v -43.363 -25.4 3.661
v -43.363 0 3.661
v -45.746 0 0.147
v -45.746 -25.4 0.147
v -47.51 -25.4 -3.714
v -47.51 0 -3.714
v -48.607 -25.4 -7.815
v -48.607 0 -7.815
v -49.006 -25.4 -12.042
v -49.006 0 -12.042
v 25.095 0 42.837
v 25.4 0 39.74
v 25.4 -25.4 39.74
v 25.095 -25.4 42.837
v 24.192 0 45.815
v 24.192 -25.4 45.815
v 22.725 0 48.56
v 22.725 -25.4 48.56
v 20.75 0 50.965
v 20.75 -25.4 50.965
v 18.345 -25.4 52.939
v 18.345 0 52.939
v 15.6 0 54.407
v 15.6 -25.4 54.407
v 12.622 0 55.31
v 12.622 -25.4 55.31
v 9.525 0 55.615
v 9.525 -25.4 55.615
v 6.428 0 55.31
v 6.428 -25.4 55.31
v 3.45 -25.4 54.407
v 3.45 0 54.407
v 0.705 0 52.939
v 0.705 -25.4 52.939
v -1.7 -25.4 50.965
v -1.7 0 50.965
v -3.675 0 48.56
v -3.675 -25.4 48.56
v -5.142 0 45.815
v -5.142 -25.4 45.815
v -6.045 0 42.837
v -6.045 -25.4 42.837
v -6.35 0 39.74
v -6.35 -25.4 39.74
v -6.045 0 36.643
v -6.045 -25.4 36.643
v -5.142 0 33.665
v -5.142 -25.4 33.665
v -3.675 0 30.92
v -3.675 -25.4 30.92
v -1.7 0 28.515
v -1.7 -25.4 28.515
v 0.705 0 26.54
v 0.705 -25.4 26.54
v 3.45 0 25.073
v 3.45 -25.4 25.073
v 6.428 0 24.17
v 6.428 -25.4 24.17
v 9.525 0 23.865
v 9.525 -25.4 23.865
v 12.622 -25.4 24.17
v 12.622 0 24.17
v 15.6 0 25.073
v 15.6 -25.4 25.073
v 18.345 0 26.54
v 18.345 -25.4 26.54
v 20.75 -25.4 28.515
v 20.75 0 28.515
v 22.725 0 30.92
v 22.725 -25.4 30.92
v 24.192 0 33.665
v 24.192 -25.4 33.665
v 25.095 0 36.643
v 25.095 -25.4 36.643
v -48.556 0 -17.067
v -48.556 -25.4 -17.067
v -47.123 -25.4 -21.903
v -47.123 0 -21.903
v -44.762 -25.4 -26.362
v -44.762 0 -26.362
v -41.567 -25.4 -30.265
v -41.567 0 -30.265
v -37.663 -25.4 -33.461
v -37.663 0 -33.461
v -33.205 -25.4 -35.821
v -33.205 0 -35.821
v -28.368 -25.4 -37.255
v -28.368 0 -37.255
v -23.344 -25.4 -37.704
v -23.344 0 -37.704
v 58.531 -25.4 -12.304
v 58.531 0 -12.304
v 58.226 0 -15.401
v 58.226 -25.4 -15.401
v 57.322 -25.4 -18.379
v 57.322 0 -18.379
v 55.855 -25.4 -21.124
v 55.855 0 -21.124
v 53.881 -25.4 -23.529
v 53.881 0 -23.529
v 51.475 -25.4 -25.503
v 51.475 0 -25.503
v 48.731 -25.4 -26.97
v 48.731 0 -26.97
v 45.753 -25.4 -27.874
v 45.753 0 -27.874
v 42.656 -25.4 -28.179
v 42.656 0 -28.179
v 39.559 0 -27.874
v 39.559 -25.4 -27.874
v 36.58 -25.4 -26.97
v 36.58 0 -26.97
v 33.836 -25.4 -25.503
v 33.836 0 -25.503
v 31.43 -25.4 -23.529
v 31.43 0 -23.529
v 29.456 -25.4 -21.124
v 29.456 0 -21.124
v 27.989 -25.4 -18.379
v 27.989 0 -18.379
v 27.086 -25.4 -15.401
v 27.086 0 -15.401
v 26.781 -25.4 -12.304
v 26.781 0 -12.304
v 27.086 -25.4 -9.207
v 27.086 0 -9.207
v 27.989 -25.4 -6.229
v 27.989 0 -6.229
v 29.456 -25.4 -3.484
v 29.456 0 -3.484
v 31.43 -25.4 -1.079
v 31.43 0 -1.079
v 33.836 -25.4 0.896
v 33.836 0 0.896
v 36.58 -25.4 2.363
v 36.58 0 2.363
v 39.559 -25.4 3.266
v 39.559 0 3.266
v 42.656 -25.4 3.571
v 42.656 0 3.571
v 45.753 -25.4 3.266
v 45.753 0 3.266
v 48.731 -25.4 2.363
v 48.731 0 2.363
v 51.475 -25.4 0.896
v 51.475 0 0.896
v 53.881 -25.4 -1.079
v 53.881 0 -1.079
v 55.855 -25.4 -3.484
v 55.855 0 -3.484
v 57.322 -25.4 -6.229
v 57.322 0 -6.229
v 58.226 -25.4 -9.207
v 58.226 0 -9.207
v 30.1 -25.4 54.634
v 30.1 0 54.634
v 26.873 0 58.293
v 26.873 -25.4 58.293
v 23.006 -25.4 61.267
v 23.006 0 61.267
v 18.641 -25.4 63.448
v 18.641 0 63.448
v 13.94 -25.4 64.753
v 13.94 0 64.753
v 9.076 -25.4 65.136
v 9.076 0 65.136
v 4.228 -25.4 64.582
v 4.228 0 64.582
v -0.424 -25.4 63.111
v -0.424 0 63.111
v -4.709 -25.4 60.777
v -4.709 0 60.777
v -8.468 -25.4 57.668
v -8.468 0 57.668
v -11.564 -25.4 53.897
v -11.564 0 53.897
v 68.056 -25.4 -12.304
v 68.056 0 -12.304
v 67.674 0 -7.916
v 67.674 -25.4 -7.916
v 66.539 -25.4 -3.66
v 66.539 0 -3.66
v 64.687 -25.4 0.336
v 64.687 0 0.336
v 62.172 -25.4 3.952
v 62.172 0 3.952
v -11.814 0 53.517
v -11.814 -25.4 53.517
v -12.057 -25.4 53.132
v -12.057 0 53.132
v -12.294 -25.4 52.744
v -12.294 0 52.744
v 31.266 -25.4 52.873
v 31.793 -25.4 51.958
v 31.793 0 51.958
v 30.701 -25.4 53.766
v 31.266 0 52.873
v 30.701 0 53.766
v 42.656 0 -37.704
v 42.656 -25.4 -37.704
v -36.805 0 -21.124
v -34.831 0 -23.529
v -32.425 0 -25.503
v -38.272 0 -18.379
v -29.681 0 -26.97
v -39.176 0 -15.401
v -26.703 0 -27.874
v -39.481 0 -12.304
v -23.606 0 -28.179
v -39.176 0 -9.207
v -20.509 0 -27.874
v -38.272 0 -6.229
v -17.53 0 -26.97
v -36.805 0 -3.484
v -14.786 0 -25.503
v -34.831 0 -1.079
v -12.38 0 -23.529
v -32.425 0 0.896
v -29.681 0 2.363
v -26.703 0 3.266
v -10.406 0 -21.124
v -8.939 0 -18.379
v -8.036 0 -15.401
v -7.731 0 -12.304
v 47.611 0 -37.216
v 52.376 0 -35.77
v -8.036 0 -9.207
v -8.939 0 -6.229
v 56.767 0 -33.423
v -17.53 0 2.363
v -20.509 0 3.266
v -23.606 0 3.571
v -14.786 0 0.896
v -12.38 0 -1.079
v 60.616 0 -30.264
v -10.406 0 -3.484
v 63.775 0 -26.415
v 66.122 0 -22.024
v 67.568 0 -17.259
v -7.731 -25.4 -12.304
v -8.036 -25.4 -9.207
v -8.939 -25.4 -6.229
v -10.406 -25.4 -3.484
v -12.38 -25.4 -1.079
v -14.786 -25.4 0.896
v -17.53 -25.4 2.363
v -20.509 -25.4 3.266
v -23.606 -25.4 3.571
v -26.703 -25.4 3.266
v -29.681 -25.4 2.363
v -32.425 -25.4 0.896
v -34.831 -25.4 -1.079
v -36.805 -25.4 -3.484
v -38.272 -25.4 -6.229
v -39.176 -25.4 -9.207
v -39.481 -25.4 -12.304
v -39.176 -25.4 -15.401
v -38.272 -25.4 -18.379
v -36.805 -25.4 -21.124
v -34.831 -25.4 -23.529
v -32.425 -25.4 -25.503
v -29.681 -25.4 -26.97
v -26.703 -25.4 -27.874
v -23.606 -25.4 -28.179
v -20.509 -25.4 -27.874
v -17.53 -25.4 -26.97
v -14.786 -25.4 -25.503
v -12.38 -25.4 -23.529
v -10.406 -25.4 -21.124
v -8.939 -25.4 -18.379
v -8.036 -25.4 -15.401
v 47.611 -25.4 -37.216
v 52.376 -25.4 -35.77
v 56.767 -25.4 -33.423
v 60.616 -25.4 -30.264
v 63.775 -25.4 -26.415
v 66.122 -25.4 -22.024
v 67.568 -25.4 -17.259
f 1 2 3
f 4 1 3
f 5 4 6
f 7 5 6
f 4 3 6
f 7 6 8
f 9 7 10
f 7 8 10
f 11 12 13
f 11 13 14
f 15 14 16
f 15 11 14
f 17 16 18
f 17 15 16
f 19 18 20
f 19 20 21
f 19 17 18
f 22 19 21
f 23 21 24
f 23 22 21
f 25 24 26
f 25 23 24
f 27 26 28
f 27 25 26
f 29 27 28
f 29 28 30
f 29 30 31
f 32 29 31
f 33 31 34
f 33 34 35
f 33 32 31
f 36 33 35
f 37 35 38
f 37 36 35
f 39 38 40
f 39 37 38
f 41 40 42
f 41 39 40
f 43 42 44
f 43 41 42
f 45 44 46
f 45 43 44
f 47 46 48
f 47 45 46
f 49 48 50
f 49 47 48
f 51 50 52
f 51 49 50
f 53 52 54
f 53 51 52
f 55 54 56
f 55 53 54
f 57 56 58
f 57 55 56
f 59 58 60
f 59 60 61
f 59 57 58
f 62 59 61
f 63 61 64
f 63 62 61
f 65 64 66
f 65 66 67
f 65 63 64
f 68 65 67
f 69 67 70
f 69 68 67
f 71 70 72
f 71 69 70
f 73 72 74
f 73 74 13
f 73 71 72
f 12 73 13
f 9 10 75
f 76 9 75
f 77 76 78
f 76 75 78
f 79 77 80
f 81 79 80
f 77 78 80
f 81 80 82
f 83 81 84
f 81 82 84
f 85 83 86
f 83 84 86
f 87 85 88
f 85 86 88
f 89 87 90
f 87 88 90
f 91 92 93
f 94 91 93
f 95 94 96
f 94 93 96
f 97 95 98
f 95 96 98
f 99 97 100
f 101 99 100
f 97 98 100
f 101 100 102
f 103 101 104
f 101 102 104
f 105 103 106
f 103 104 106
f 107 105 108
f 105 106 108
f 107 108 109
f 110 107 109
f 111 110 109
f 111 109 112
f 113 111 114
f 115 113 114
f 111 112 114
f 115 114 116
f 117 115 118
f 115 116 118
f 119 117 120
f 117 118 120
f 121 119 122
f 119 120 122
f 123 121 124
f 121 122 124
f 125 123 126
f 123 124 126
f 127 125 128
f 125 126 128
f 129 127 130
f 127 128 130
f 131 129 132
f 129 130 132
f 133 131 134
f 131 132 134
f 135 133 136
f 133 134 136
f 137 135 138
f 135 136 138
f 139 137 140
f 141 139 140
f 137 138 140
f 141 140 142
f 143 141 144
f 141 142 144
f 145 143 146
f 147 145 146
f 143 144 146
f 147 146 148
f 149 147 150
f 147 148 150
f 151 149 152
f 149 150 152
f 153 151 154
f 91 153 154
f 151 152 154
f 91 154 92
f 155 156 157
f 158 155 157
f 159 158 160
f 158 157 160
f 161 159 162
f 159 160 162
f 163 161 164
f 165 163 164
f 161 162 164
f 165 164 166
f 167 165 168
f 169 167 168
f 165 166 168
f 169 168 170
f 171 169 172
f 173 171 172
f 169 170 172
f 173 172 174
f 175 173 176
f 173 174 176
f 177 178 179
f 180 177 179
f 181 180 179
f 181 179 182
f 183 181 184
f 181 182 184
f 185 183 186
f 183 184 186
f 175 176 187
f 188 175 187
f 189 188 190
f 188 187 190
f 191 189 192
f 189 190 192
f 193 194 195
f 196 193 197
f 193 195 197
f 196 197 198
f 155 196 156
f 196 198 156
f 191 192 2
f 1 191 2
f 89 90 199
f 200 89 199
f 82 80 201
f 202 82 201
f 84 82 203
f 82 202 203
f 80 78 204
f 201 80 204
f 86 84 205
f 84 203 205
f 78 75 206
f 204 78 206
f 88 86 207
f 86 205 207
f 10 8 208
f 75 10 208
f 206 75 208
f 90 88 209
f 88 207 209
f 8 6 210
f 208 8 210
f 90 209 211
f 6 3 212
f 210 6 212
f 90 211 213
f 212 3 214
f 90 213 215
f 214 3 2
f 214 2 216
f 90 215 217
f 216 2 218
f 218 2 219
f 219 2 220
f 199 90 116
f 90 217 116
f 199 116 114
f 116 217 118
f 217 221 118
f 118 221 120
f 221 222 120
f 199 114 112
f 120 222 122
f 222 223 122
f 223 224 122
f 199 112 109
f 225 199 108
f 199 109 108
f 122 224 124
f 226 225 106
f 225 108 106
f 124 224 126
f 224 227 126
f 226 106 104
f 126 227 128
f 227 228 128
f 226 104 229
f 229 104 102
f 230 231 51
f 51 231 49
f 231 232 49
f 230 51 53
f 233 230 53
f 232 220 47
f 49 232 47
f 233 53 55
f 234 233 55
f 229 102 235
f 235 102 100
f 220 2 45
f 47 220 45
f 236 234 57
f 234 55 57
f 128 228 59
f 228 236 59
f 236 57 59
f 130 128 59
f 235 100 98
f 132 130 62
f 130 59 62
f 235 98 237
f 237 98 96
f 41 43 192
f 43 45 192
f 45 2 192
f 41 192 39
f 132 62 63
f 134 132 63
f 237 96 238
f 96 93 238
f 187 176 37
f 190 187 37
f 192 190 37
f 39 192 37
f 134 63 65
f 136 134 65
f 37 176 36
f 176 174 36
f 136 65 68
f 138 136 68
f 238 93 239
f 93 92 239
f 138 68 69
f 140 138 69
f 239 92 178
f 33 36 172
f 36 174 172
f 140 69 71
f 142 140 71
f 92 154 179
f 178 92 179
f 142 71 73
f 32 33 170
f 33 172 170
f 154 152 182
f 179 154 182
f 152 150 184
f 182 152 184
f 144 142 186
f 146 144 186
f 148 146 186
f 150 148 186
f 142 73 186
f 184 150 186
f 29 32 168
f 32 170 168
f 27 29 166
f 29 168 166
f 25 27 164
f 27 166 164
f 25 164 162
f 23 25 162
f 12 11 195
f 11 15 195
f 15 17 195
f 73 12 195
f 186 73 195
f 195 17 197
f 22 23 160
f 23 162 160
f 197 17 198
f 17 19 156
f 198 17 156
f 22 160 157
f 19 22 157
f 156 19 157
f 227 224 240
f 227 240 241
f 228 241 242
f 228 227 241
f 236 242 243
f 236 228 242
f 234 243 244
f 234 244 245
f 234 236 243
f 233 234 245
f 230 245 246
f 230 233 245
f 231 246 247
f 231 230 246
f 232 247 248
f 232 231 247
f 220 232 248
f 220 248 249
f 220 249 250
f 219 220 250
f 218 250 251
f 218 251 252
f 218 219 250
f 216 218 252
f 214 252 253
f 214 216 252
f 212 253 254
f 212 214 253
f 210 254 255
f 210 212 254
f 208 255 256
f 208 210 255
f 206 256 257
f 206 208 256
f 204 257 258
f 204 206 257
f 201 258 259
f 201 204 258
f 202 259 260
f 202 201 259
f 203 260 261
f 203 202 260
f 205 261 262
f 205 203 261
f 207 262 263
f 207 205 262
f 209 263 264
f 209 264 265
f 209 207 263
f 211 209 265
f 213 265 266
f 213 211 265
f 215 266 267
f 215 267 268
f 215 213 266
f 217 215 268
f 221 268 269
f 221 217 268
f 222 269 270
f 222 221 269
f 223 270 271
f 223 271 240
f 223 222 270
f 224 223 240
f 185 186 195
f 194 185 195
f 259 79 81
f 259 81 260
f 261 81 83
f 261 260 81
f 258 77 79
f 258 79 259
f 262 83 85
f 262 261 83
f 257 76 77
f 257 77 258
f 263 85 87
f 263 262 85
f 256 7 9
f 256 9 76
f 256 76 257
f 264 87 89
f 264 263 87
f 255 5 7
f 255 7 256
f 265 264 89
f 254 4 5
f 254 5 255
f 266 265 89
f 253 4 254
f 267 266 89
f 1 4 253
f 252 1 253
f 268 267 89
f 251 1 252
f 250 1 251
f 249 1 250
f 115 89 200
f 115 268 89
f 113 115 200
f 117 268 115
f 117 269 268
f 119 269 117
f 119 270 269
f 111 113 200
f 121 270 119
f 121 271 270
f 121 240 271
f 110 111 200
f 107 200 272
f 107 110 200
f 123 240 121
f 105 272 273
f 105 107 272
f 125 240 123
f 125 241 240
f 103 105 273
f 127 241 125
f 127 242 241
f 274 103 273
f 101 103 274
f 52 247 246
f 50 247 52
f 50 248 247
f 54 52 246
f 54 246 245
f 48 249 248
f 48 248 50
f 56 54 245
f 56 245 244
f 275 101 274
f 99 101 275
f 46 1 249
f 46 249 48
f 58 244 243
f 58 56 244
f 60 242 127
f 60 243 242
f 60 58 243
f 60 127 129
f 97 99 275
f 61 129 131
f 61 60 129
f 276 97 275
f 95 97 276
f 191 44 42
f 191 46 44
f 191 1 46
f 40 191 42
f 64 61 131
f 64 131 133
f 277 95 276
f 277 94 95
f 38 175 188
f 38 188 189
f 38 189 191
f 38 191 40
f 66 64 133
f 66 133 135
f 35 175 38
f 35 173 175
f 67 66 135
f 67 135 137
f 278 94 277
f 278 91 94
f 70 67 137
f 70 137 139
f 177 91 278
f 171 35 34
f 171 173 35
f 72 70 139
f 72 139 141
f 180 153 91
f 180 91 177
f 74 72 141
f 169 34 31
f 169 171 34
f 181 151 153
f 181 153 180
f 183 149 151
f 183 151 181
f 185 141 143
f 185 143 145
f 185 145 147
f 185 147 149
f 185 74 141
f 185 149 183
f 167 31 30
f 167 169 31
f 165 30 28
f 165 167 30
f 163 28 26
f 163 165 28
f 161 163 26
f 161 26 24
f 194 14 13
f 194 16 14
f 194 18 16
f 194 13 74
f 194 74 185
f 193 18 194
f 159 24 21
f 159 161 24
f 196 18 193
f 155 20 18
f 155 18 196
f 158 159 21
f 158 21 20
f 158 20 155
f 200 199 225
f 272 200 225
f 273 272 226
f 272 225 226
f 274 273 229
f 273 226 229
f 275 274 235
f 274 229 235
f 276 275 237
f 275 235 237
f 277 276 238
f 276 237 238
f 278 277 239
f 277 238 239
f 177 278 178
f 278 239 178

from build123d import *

# Parameters (mm, degrees)
F0_R     = 15.875
F1_DEPTH = 25.4


with BuildPart() as f1:
    # F0 (on Front) → F1 (new body)
    with BuildSketch(Plane.XZ):
        with BuildLine():
            ThreePointArc((-49.0055754781, -12.3038528651), (-41.5660877202, -30.2643651072), (-23.6055754781, -37.7038528651))
            Line((-23.6055754781, -37.7038528651), (-23.3435511934, -37.7038528651))
            Line((-23.3435511934, -37.7038528651), (42.6555754781, -37.7038528651))
            ThreePointArc((42.6555754781, -37.7038528651), (60.6160877202, -30.2643651072), (68.0555754781, -12.3038528651))
            ThreePointArc((68.0555754781, -12.3038528651), (66.5394936483, -3.6598692442), (62.1722327349, 3.9522256755))
            Line((62.1722327349, 3.9522256755), (31.7932017285, 51.9582280247))
            Line((31.7932017285, 51.9582280247), (30.1001638771, 54.6336253754))
            ThreePointArc((30.1001638771, 54.6336253754), (9.0757549966, 65.1359410719), (-11.5640531978, 53.8966029481))
            Line((-11.5640531978, 53.8966029481), (-12.2938214906, 52.7437224792))
            Line((-12.2938214906, 52.7437224792), (-43.3631999383, 3.6606368673))
            ThreePointArc((-43.3631999383, 3.6606368673), (-47.5104832797, -3.714089206), (-49.0055754781, -12.0418285804))
            Line((-49.0055754781, -12.0418285804), (-49.0055754781, -12.3038528651))
        make_face()
        with Locations((-23.6055754781, -12.3038528651)):
            Circle(F0_R, mode=Mode.SUBTRACT)
        with BuildLine():
            ThreePointArc((26.7805754781, -12.3038528651), (42.6555754781, 3.5711471349), (58.5305754781, -12.3038528651))
            ThreePointArc((58.5305754781, -12.3038528651), (42.6555754781, -28.1788528651), (26.7805754781, -12.3038528651))
        make_face(mode=Mode.SUBTRACT)
        with Locations((9.525, 39.7399142385)):
            Circle(F0_R, mode=Mode.SUBTRACT)
        with BuildLine():
            Line((-23.3435511934, -37.7038528651), (-23.6055754781, -37.7038528651))
            ThreePointArc((-23.6055754781, -37.7038528651), (-41.5660877202, -30.2643651072), (-49.0055754781, -12.3038528651))
            Line((-49.0055754781, -12.3038528651), (-49.0055754781, -12.0418285804))
            ThreePointArc((-49.0055754781, -12.0418285804), (-41.5670433569, -30.2653207439), (-23.3435511934, -37.7038528651))
        make_face()
        with BuildLine():
            ThreePointArc((-11.5640531978, 53.8966029481), (-11.936680058, 53.3250638176), (-12.2938214906, 52.7437224792))
            Line((-12.2938214906, 52.7437224792), (-11.5640531978, 53.8966029481))
        make_face()
        with BuildLine():
            Line((30.1001638771, 54.6336253754), (31.7932017285, 51.9582280247))
            ThreePointArc((31.7932017285, 51.9582280247), (30.9884091386, 53.3223318491), (30.1001638771, 54.6336253754))
        make_face()
    extrude(amount=F1_DEPTH)


solid = f1.part
